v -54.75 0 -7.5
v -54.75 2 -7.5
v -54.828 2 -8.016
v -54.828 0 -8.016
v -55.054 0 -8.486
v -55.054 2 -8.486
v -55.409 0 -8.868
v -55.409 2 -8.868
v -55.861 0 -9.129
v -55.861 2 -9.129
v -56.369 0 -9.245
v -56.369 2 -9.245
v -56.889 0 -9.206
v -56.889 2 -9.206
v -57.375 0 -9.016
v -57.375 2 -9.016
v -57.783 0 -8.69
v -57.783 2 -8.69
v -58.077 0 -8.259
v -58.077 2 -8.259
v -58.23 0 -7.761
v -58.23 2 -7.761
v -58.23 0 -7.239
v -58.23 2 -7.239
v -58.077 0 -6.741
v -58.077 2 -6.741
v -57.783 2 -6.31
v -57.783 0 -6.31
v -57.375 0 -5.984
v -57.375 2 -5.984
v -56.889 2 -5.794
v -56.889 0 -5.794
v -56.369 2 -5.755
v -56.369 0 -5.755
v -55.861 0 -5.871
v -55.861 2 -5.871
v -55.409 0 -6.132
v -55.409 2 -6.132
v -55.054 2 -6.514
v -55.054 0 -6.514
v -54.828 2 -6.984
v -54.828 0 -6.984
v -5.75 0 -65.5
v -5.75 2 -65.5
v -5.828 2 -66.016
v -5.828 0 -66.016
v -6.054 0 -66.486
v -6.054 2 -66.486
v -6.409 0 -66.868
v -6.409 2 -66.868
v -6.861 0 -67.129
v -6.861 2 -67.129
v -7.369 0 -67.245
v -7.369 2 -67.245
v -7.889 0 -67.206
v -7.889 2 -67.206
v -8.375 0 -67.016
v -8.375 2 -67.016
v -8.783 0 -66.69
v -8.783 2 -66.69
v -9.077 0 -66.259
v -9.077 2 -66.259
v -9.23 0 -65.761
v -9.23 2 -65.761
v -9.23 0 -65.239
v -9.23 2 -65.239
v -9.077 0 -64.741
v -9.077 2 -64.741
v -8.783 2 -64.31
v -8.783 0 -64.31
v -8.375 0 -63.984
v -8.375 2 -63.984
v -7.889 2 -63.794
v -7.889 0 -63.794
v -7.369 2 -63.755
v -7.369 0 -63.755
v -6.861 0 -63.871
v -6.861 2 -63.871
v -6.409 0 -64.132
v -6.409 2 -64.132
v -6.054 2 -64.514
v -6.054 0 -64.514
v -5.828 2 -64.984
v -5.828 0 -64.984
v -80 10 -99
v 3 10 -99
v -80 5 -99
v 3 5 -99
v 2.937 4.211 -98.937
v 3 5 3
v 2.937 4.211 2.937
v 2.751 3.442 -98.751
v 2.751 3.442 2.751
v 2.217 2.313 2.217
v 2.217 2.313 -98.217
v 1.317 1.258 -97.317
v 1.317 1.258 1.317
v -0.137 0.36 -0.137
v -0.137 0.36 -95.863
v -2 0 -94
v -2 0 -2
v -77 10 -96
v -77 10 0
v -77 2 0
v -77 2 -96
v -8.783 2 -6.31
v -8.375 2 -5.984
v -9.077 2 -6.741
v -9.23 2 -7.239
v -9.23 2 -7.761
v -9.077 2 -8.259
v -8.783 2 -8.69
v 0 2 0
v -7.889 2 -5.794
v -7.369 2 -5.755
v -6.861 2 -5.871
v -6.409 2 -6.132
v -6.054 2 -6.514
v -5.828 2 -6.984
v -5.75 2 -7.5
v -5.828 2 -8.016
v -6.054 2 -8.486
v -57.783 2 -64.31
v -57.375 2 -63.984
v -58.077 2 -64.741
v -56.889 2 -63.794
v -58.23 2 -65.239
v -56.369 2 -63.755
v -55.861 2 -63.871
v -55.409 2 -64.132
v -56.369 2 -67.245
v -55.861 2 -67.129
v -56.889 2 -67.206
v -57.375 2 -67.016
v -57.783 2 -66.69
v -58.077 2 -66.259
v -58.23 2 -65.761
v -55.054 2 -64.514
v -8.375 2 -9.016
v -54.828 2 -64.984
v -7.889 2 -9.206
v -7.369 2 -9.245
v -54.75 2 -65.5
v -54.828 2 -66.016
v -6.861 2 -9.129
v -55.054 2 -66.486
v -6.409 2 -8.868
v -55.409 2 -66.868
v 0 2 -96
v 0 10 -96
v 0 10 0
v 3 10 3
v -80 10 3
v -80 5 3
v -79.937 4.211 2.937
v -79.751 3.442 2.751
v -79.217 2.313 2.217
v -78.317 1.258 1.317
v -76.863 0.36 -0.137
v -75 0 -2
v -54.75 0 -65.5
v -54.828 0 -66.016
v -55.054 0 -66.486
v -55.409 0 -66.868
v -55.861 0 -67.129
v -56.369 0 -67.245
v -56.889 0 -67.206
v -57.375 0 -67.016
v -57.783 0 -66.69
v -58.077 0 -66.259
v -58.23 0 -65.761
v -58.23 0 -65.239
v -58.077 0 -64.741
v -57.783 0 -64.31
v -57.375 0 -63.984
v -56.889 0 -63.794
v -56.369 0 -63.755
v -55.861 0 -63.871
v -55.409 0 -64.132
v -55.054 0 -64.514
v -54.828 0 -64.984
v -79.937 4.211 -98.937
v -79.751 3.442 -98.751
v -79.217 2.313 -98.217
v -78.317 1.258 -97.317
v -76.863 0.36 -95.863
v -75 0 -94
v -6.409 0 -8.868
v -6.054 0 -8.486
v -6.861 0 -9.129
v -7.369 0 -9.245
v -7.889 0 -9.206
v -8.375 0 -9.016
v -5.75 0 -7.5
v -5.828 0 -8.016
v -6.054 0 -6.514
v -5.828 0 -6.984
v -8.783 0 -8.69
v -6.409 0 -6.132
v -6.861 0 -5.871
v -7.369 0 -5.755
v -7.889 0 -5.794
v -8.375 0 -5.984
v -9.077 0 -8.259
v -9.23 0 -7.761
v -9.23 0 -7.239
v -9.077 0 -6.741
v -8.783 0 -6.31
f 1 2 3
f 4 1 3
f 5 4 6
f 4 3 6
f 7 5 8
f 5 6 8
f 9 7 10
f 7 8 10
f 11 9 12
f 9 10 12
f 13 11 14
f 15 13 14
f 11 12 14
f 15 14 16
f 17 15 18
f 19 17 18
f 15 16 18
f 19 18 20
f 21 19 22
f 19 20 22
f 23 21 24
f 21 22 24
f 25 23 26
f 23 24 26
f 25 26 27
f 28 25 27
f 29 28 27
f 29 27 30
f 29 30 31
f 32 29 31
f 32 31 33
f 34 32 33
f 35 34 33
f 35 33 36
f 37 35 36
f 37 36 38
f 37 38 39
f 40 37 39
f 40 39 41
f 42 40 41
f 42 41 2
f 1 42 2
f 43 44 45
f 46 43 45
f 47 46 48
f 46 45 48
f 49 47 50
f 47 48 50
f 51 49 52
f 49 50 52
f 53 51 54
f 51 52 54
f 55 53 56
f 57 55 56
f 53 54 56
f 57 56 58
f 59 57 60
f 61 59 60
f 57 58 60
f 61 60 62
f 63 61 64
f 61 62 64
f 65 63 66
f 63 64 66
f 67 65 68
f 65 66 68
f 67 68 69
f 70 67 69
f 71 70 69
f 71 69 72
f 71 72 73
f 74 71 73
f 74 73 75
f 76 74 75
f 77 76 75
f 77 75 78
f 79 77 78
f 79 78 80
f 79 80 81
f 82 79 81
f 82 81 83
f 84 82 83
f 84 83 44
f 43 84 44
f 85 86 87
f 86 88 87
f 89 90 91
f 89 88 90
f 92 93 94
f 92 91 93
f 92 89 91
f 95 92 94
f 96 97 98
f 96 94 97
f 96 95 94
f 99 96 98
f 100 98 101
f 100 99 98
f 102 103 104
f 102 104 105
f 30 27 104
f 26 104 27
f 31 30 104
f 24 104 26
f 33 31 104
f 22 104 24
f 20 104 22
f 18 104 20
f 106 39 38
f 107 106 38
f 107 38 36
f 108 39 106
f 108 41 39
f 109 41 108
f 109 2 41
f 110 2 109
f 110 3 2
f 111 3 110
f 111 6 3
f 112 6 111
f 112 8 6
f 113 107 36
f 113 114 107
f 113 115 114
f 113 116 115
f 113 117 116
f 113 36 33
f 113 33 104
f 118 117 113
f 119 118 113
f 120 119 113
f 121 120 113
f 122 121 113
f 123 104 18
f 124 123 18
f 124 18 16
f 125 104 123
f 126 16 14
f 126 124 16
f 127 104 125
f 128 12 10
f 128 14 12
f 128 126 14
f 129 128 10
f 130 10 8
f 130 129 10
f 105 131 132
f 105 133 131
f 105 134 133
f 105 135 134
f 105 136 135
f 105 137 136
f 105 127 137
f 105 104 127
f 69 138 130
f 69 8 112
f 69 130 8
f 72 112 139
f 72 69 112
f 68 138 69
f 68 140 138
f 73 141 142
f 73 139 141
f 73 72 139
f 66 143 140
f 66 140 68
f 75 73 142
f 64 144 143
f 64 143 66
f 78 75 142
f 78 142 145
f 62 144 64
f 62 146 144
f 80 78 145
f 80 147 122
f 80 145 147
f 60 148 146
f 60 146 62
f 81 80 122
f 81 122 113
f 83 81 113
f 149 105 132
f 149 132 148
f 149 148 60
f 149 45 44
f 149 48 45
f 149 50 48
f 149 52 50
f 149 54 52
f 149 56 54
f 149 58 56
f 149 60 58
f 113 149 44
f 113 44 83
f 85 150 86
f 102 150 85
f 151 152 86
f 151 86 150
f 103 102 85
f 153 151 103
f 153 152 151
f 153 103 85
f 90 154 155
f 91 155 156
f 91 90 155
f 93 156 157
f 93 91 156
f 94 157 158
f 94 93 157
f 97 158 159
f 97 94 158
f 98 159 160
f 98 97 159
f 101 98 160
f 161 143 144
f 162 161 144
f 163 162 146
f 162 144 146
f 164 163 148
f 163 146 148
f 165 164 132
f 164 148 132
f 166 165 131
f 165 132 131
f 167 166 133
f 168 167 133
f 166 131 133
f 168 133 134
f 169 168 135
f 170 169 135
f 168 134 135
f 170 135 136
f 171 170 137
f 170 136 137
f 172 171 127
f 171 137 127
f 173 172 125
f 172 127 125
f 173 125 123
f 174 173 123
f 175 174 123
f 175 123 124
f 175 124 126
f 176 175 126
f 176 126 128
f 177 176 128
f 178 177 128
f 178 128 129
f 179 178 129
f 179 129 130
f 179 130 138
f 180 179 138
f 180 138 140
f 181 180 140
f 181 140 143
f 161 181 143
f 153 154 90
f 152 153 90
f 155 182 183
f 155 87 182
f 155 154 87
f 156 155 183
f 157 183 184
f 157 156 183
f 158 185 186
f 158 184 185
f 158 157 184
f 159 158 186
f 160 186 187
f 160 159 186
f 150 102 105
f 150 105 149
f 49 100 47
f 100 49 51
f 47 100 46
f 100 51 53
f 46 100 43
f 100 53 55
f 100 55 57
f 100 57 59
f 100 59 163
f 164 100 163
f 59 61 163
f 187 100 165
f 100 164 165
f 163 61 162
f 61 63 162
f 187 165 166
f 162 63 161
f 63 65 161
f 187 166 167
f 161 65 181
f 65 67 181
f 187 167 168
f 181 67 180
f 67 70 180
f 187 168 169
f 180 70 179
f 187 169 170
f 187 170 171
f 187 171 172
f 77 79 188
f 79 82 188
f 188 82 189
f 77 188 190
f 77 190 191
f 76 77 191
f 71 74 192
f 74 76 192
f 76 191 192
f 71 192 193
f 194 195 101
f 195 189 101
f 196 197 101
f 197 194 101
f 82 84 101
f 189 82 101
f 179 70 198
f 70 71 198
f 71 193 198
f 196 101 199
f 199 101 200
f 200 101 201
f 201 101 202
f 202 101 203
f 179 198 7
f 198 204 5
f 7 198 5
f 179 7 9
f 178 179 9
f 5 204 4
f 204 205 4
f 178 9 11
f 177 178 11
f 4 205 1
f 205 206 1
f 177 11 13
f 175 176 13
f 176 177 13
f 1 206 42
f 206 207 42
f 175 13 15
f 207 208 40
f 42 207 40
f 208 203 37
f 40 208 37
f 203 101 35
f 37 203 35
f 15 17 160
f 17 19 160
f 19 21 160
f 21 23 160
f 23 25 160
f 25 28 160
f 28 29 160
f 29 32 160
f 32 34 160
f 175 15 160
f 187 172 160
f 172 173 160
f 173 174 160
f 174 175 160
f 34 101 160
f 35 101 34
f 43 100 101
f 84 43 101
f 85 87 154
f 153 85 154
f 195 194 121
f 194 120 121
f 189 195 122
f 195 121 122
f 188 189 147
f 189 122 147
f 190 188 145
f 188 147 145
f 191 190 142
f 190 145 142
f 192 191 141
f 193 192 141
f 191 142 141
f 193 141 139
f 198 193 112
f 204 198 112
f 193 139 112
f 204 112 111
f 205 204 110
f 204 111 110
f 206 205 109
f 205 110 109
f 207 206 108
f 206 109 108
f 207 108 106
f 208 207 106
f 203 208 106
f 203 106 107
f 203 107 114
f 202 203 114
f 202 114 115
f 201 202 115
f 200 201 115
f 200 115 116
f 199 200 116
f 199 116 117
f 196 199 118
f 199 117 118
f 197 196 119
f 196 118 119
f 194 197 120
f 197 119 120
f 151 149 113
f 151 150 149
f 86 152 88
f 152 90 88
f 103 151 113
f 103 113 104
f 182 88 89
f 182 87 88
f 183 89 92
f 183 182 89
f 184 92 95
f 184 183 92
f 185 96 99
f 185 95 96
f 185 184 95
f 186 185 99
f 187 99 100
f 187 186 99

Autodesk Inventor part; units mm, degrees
ref_plane "YZ Plane" through (0, 0, 0) normal (1, 0, 0) x (0, 1, 0)
ref_plane "XZ Plane" through (0, 0, 0) normal (0, 1, 0) x (-1, 0, 0)
ref_plane "XY Plane" through (0, 0, 0) normal (0, 0, 1) x (1, 0, 0)
sketch "Sketch1" plane through (0, 0, 0) normal (0, 1, 0) x (-1, 0, 0)
  line L0 (0, 0) -> (77, 0)
  line L1 (77, 0) -> (77, -96)
  line L2 (77, -96) -> (0, -96)
  line L3 (0, -96) -> (0, 0)
  line L4 (80, -99) -> (80, 3)
  line L5 (80, 3) -> (-3, 3)
  line L6 (-3, 3) -> (-3, -99)
  line L7 (-3, -99) -> (80, -99)
  dimension "d0" = 77
  dimension "d1" = 96
  dimension "d2" = 3
extrude "Extrusion1" add sketch "Sketch1" along normal blind 10 contours L0 L1 L2 L3 | L7 L6 L5 L4
sketch "Sketch2" plane through (0, 10, 0) normal (0, 1, 0) x (1, 0, 0)
  line L0 (0, 0) -> (-77, 0)
  line L1 (-77, 0) -> (-77, 96)
  line L2 (-77, 96) -> (0, 96)
  line L3 (0, 96) -> (0, 0)
  dimension "d5" = 77
  dimension "d6" = 96
extrude "Extrusion2" cut sketch "Sketch2" against normal blind 8
sketch "Sketch3" plane through (0, 2, 0) normal (0, 1, 0) x (1, 0, 0)
  line L0 (0, 96) -> (0, 0) projected
  line L1 (0, 0) -> (0, 7.5)
  line L2 (0, 7.5) -> (-7.5, 7.5)
  circle A0 centre (-7.5, 7.5) radius 1.75
  circle A1 centre (-7.5, 65.5) radius 1.75
  circle A2 centre (-56.5, 7.5) radius 1.75
  circle A3 centre (-56.5, 65.5) radius 1.75
  dimension "d9" = 7.5
  dimension "d10" = 7.5
  dimension "d11" = 3.5
  dimension "d14" = 58
  dimension "d17" = 49
extrude "Extrusion3" cut sketch "Sketch3" against normal blind 3
fillet "Fillet1" radius 5 4 edges at (-38.5, 0, 3) (-80, 0, -48) (3, 0, -48) (-38.5, 0, -99)
properties part number "MainPCB_RPI_Top"
